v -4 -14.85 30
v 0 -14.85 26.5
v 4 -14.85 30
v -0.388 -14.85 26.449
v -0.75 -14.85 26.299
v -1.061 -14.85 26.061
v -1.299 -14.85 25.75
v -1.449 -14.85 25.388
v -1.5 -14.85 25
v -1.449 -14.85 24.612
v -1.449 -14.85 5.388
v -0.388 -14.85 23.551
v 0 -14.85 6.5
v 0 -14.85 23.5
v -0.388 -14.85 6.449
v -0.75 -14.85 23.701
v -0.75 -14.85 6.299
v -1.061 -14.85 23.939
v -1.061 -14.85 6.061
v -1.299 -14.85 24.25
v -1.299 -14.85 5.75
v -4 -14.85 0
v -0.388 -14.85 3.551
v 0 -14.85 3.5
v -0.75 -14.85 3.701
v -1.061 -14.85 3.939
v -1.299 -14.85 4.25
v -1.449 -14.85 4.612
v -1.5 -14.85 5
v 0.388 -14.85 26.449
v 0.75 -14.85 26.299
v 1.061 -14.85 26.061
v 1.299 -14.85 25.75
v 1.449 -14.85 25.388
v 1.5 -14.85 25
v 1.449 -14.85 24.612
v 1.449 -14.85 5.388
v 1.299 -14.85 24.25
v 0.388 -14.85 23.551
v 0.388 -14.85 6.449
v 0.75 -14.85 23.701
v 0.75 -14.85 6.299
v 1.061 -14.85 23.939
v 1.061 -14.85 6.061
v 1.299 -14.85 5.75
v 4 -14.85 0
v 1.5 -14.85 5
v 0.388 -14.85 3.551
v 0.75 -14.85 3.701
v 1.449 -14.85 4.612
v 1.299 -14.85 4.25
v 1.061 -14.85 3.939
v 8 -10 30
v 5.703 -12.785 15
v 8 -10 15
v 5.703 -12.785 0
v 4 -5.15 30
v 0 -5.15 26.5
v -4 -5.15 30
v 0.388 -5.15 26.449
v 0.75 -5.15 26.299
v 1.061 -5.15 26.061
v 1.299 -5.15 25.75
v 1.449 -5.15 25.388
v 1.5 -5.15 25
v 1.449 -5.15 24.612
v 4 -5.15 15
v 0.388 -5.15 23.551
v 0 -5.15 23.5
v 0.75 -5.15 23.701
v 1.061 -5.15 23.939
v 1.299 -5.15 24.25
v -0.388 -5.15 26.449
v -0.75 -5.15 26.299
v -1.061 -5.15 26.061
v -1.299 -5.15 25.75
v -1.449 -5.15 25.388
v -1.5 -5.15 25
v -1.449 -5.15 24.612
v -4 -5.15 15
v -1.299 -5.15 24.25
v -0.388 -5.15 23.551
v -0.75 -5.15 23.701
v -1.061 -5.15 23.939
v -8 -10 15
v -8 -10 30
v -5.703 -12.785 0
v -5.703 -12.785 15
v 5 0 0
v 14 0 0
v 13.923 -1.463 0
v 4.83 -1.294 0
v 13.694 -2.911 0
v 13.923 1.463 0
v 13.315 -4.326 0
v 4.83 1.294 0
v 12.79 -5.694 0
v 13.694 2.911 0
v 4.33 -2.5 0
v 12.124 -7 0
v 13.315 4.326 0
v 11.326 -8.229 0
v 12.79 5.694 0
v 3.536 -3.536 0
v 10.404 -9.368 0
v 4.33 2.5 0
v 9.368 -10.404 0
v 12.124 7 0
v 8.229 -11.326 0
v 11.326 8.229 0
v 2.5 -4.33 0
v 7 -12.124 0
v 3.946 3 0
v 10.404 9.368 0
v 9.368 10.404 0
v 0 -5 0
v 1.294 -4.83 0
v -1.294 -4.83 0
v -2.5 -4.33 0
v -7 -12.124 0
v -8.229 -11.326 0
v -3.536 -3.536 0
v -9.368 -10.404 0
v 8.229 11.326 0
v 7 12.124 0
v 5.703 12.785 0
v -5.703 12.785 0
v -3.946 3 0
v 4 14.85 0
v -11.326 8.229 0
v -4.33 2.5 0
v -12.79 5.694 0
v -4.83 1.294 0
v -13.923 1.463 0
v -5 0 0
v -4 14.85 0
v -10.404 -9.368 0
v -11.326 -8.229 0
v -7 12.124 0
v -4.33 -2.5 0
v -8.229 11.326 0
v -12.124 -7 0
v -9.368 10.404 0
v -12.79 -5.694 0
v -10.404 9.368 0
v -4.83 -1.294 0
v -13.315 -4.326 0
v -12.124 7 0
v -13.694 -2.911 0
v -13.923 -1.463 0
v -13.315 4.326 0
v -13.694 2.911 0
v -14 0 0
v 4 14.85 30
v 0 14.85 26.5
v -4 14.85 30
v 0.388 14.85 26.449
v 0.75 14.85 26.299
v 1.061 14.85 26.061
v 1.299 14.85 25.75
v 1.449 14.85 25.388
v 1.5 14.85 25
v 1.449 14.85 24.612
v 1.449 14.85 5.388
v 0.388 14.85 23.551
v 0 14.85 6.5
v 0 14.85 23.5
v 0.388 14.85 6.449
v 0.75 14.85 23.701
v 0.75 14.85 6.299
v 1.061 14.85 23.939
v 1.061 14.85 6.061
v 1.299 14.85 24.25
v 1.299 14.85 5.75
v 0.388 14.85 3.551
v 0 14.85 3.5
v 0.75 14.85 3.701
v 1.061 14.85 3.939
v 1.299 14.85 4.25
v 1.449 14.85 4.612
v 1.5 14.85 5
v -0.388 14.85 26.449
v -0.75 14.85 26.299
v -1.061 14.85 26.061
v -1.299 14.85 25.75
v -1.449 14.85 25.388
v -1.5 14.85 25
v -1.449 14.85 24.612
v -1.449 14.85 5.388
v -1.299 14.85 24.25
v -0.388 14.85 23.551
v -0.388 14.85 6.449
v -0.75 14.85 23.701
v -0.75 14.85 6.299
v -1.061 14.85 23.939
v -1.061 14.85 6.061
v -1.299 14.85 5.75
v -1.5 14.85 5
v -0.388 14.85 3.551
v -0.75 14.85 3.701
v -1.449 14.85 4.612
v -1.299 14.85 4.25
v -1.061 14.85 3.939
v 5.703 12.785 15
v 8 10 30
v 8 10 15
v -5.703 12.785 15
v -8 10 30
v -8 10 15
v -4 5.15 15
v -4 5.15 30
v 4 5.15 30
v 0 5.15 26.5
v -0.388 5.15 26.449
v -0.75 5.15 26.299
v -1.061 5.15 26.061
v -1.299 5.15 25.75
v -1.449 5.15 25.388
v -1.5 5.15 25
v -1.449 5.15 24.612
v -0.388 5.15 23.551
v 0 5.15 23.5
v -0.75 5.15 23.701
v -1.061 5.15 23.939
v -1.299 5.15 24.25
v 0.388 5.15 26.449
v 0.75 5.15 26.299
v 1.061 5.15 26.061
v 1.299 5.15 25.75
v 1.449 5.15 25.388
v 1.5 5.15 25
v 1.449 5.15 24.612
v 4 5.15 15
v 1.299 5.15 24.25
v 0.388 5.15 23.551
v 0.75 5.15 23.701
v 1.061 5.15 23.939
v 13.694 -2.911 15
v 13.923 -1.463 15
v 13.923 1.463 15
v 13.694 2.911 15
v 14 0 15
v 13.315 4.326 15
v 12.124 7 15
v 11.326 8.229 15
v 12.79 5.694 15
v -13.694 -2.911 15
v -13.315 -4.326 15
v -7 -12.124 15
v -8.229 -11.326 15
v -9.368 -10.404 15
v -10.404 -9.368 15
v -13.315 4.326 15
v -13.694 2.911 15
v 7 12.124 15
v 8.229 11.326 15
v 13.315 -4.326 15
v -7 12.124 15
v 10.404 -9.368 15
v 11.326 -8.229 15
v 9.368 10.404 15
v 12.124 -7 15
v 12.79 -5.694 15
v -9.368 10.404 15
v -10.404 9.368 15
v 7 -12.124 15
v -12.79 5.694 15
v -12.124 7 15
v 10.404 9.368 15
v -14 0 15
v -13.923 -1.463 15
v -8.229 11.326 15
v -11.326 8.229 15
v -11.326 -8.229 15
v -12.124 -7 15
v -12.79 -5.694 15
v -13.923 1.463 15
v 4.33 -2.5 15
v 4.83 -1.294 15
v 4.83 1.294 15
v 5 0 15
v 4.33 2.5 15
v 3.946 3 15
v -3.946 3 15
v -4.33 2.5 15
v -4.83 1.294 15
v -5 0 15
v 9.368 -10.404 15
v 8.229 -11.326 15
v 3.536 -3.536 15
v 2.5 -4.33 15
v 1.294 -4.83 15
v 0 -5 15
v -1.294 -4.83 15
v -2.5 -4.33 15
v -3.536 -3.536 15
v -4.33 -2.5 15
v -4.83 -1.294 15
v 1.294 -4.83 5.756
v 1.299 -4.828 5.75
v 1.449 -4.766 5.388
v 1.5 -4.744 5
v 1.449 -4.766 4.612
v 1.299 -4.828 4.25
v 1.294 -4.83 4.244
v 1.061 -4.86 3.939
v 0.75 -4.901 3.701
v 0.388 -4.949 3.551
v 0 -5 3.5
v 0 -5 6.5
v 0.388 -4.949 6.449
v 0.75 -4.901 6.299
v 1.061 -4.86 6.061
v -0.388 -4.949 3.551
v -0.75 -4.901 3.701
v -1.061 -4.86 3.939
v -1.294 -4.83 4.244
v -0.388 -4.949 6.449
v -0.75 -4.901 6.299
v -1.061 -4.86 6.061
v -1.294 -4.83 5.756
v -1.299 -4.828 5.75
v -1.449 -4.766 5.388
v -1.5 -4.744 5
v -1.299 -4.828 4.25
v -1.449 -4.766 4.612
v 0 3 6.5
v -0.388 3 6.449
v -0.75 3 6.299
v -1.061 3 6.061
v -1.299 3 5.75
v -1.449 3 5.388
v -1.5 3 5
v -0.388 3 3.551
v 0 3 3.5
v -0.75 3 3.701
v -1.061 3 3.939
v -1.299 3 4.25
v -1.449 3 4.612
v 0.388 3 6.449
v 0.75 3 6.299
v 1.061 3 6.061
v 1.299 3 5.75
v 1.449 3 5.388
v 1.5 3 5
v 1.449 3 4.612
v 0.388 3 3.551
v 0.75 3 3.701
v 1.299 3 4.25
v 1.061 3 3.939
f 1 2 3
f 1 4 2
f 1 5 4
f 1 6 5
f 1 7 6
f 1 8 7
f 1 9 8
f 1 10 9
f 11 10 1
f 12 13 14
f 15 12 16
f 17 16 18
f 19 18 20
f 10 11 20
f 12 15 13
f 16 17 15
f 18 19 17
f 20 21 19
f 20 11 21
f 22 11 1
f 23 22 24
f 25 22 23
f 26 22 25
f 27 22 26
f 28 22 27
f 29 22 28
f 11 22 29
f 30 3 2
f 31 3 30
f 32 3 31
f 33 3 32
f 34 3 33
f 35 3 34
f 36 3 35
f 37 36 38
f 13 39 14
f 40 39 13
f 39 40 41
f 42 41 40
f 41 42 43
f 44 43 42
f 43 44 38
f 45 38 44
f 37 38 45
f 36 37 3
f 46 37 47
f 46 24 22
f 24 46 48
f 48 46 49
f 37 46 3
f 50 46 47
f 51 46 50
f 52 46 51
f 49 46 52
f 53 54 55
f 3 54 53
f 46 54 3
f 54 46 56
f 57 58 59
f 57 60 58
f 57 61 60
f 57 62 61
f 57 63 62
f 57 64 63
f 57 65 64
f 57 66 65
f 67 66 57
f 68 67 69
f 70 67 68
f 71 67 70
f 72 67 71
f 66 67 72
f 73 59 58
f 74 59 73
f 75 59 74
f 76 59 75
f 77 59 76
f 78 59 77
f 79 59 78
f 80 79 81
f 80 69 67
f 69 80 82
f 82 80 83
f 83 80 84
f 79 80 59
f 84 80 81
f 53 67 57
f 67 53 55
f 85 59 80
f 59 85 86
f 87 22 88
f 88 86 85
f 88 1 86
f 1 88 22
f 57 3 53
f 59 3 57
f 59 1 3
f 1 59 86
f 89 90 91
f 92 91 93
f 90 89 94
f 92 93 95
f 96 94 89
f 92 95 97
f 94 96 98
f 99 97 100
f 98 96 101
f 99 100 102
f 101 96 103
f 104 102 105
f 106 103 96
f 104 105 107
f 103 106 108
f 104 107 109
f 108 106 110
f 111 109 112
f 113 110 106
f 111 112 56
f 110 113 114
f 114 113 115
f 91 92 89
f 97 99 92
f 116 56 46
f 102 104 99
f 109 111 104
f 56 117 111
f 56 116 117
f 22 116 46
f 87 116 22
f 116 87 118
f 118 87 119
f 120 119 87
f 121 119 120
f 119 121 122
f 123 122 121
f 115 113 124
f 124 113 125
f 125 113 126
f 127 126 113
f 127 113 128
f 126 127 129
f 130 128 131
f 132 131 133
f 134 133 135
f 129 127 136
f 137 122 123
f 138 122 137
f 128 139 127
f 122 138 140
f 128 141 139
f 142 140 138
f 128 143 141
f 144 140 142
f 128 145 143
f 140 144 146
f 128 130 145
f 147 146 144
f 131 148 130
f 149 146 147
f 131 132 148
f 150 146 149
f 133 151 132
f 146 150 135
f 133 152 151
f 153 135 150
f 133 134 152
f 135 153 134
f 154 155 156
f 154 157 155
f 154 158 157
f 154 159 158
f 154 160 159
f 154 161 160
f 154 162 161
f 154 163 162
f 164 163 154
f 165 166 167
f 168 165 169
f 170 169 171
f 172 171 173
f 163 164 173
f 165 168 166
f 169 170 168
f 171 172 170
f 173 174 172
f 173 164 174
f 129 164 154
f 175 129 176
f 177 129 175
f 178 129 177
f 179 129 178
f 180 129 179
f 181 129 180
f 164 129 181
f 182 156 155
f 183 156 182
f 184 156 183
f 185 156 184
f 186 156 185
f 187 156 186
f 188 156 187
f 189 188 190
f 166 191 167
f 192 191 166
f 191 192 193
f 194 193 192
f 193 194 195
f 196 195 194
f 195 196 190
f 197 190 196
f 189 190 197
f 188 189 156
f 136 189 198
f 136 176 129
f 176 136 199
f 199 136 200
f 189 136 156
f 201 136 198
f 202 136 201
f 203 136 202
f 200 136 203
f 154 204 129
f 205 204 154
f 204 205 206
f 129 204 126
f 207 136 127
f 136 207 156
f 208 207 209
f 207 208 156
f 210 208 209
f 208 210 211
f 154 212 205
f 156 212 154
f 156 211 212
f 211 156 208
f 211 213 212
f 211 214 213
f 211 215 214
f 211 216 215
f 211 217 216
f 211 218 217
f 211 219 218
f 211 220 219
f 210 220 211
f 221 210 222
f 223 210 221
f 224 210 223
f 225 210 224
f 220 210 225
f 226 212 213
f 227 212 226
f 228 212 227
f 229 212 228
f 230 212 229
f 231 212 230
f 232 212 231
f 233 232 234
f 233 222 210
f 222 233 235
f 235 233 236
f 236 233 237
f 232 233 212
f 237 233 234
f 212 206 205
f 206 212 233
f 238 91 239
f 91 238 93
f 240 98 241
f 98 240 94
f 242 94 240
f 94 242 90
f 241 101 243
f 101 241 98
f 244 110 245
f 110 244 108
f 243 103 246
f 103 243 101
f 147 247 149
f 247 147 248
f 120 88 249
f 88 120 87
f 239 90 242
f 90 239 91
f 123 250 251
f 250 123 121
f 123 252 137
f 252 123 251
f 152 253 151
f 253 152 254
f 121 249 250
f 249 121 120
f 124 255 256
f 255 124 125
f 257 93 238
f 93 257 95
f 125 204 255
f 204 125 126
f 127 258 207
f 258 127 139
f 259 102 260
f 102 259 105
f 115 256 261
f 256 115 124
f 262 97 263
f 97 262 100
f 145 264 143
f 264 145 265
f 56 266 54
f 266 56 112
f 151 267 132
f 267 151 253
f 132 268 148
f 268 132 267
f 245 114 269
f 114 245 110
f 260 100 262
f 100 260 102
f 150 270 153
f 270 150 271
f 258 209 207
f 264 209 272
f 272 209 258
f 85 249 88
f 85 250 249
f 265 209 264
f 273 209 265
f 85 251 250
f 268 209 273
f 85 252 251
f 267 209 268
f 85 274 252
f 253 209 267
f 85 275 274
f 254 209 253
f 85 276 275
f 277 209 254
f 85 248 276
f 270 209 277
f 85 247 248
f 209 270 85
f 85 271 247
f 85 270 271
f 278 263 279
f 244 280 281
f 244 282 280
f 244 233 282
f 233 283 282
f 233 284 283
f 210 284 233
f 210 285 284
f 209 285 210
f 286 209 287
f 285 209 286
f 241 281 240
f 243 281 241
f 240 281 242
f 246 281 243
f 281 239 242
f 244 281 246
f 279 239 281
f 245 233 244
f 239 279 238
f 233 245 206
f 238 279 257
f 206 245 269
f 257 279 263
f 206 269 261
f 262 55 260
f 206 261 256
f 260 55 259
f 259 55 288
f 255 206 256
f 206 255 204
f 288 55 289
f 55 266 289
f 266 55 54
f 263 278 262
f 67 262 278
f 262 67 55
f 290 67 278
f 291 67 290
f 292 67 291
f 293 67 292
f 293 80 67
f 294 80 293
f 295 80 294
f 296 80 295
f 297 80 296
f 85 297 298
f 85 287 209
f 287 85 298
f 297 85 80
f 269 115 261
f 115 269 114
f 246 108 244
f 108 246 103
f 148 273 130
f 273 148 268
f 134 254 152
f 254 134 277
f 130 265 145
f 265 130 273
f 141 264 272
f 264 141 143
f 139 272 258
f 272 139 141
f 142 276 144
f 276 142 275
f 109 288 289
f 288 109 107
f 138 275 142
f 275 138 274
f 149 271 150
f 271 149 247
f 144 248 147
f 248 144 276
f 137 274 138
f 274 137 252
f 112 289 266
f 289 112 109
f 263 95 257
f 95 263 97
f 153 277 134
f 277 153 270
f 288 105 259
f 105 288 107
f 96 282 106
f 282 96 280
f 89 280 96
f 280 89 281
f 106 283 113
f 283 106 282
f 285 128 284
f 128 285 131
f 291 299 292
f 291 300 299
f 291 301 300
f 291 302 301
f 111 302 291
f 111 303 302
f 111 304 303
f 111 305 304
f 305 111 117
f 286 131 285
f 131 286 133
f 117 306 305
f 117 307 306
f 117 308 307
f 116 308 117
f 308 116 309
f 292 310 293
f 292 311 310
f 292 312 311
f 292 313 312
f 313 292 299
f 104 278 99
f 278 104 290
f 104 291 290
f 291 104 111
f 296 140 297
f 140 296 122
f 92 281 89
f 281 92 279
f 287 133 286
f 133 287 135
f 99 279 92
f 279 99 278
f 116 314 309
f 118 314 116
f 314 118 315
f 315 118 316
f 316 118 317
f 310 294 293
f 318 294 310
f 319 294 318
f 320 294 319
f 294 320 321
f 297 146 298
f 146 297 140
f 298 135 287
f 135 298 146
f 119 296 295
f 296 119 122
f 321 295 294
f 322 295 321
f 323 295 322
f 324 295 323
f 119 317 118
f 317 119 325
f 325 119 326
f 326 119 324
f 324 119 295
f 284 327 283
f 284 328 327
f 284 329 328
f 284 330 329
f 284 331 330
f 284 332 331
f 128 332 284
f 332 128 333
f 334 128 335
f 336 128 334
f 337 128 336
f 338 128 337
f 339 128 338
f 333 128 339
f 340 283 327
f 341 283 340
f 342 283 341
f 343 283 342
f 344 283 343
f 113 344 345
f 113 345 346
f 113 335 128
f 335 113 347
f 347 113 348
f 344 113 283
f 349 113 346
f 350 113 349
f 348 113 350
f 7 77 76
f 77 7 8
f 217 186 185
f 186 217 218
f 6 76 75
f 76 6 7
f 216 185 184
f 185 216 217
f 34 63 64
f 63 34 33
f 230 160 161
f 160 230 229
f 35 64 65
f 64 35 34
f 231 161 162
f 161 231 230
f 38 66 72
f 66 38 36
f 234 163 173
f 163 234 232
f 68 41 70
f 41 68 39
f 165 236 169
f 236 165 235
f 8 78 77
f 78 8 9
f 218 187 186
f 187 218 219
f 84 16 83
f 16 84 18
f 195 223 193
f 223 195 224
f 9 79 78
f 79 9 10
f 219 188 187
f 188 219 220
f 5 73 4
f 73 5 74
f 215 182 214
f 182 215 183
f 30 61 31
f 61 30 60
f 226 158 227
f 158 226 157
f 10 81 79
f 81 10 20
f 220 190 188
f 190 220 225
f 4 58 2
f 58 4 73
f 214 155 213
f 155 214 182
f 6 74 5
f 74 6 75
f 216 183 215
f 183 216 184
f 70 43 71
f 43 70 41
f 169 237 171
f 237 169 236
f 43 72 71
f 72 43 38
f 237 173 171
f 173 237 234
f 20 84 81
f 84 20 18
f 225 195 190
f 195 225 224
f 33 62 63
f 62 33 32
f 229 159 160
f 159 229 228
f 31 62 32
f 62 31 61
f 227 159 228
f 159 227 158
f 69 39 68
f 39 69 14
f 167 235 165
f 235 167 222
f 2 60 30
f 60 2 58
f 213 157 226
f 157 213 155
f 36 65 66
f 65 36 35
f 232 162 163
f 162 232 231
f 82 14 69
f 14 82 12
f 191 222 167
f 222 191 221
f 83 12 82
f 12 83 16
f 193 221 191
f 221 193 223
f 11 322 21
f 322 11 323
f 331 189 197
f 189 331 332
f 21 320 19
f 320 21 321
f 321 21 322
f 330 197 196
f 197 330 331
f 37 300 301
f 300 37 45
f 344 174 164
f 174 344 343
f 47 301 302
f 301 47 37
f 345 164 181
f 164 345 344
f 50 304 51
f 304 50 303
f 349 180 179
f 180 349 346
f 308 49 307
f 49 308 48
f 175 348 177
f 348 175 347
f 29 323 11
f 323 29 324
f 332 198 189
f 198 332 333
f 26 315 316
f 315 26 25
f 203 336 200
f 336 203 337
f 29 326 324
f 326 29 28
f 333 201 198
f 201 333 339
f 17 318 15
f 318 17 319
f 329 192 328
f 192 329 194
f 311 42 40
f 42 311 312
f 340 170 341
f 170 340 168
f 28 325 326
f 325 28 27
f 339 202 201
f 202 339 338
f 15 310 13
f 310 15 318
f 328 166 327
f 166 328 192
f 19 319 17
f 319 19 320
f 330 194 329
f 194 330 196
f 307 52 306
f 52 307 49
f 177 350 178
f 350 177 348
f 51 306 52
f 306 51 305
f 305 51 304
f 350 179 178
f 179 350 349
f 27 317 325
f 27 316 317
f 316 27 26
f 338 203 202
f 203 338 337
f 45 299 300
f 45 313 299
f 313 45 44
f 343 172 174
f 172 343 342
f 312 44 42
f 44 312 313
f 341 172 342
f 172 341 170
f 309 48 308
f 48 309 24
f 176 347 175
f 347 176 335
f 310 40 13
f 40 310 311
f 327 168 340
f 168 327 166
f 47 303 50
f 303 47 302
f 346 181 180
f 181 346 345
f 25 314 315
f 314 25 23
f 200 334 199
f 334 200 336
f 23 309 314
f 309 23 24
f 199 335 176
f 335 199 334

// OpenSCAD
module hub(shaft, height) {
    difference() {
        union() {
            cylinder(r=14, h=height-15, $fn=60);
            for (y = [-10, 10]) {
                translate([0, y, 0]) scale([1, 0.7, 1]) cylinder(r=8, h=height, $fn=6);
            }
        }
        difference() {
            cylinder(r=shaft/2, h=100, center=true, $fn=24);
            translate([0, shaft*0.8, 0]) cube([shaft, shaft, 2*height], center=true);
        }
        translate([0, 0, height-5]) rotate([90, 0, 0])
            cylinder(r=1.5, h=60, center=true, $fn=24);
        translate([0, 0, 5]) rotate([90, 0, 0])
            cylinder(r=1.5, h=60, center=true, $fn=24);
    }
}

h = 30;
hub(10, h);
% translate([0, 0, 2*h-5]) rotate([0, 180, 90]) hub(5, h);
